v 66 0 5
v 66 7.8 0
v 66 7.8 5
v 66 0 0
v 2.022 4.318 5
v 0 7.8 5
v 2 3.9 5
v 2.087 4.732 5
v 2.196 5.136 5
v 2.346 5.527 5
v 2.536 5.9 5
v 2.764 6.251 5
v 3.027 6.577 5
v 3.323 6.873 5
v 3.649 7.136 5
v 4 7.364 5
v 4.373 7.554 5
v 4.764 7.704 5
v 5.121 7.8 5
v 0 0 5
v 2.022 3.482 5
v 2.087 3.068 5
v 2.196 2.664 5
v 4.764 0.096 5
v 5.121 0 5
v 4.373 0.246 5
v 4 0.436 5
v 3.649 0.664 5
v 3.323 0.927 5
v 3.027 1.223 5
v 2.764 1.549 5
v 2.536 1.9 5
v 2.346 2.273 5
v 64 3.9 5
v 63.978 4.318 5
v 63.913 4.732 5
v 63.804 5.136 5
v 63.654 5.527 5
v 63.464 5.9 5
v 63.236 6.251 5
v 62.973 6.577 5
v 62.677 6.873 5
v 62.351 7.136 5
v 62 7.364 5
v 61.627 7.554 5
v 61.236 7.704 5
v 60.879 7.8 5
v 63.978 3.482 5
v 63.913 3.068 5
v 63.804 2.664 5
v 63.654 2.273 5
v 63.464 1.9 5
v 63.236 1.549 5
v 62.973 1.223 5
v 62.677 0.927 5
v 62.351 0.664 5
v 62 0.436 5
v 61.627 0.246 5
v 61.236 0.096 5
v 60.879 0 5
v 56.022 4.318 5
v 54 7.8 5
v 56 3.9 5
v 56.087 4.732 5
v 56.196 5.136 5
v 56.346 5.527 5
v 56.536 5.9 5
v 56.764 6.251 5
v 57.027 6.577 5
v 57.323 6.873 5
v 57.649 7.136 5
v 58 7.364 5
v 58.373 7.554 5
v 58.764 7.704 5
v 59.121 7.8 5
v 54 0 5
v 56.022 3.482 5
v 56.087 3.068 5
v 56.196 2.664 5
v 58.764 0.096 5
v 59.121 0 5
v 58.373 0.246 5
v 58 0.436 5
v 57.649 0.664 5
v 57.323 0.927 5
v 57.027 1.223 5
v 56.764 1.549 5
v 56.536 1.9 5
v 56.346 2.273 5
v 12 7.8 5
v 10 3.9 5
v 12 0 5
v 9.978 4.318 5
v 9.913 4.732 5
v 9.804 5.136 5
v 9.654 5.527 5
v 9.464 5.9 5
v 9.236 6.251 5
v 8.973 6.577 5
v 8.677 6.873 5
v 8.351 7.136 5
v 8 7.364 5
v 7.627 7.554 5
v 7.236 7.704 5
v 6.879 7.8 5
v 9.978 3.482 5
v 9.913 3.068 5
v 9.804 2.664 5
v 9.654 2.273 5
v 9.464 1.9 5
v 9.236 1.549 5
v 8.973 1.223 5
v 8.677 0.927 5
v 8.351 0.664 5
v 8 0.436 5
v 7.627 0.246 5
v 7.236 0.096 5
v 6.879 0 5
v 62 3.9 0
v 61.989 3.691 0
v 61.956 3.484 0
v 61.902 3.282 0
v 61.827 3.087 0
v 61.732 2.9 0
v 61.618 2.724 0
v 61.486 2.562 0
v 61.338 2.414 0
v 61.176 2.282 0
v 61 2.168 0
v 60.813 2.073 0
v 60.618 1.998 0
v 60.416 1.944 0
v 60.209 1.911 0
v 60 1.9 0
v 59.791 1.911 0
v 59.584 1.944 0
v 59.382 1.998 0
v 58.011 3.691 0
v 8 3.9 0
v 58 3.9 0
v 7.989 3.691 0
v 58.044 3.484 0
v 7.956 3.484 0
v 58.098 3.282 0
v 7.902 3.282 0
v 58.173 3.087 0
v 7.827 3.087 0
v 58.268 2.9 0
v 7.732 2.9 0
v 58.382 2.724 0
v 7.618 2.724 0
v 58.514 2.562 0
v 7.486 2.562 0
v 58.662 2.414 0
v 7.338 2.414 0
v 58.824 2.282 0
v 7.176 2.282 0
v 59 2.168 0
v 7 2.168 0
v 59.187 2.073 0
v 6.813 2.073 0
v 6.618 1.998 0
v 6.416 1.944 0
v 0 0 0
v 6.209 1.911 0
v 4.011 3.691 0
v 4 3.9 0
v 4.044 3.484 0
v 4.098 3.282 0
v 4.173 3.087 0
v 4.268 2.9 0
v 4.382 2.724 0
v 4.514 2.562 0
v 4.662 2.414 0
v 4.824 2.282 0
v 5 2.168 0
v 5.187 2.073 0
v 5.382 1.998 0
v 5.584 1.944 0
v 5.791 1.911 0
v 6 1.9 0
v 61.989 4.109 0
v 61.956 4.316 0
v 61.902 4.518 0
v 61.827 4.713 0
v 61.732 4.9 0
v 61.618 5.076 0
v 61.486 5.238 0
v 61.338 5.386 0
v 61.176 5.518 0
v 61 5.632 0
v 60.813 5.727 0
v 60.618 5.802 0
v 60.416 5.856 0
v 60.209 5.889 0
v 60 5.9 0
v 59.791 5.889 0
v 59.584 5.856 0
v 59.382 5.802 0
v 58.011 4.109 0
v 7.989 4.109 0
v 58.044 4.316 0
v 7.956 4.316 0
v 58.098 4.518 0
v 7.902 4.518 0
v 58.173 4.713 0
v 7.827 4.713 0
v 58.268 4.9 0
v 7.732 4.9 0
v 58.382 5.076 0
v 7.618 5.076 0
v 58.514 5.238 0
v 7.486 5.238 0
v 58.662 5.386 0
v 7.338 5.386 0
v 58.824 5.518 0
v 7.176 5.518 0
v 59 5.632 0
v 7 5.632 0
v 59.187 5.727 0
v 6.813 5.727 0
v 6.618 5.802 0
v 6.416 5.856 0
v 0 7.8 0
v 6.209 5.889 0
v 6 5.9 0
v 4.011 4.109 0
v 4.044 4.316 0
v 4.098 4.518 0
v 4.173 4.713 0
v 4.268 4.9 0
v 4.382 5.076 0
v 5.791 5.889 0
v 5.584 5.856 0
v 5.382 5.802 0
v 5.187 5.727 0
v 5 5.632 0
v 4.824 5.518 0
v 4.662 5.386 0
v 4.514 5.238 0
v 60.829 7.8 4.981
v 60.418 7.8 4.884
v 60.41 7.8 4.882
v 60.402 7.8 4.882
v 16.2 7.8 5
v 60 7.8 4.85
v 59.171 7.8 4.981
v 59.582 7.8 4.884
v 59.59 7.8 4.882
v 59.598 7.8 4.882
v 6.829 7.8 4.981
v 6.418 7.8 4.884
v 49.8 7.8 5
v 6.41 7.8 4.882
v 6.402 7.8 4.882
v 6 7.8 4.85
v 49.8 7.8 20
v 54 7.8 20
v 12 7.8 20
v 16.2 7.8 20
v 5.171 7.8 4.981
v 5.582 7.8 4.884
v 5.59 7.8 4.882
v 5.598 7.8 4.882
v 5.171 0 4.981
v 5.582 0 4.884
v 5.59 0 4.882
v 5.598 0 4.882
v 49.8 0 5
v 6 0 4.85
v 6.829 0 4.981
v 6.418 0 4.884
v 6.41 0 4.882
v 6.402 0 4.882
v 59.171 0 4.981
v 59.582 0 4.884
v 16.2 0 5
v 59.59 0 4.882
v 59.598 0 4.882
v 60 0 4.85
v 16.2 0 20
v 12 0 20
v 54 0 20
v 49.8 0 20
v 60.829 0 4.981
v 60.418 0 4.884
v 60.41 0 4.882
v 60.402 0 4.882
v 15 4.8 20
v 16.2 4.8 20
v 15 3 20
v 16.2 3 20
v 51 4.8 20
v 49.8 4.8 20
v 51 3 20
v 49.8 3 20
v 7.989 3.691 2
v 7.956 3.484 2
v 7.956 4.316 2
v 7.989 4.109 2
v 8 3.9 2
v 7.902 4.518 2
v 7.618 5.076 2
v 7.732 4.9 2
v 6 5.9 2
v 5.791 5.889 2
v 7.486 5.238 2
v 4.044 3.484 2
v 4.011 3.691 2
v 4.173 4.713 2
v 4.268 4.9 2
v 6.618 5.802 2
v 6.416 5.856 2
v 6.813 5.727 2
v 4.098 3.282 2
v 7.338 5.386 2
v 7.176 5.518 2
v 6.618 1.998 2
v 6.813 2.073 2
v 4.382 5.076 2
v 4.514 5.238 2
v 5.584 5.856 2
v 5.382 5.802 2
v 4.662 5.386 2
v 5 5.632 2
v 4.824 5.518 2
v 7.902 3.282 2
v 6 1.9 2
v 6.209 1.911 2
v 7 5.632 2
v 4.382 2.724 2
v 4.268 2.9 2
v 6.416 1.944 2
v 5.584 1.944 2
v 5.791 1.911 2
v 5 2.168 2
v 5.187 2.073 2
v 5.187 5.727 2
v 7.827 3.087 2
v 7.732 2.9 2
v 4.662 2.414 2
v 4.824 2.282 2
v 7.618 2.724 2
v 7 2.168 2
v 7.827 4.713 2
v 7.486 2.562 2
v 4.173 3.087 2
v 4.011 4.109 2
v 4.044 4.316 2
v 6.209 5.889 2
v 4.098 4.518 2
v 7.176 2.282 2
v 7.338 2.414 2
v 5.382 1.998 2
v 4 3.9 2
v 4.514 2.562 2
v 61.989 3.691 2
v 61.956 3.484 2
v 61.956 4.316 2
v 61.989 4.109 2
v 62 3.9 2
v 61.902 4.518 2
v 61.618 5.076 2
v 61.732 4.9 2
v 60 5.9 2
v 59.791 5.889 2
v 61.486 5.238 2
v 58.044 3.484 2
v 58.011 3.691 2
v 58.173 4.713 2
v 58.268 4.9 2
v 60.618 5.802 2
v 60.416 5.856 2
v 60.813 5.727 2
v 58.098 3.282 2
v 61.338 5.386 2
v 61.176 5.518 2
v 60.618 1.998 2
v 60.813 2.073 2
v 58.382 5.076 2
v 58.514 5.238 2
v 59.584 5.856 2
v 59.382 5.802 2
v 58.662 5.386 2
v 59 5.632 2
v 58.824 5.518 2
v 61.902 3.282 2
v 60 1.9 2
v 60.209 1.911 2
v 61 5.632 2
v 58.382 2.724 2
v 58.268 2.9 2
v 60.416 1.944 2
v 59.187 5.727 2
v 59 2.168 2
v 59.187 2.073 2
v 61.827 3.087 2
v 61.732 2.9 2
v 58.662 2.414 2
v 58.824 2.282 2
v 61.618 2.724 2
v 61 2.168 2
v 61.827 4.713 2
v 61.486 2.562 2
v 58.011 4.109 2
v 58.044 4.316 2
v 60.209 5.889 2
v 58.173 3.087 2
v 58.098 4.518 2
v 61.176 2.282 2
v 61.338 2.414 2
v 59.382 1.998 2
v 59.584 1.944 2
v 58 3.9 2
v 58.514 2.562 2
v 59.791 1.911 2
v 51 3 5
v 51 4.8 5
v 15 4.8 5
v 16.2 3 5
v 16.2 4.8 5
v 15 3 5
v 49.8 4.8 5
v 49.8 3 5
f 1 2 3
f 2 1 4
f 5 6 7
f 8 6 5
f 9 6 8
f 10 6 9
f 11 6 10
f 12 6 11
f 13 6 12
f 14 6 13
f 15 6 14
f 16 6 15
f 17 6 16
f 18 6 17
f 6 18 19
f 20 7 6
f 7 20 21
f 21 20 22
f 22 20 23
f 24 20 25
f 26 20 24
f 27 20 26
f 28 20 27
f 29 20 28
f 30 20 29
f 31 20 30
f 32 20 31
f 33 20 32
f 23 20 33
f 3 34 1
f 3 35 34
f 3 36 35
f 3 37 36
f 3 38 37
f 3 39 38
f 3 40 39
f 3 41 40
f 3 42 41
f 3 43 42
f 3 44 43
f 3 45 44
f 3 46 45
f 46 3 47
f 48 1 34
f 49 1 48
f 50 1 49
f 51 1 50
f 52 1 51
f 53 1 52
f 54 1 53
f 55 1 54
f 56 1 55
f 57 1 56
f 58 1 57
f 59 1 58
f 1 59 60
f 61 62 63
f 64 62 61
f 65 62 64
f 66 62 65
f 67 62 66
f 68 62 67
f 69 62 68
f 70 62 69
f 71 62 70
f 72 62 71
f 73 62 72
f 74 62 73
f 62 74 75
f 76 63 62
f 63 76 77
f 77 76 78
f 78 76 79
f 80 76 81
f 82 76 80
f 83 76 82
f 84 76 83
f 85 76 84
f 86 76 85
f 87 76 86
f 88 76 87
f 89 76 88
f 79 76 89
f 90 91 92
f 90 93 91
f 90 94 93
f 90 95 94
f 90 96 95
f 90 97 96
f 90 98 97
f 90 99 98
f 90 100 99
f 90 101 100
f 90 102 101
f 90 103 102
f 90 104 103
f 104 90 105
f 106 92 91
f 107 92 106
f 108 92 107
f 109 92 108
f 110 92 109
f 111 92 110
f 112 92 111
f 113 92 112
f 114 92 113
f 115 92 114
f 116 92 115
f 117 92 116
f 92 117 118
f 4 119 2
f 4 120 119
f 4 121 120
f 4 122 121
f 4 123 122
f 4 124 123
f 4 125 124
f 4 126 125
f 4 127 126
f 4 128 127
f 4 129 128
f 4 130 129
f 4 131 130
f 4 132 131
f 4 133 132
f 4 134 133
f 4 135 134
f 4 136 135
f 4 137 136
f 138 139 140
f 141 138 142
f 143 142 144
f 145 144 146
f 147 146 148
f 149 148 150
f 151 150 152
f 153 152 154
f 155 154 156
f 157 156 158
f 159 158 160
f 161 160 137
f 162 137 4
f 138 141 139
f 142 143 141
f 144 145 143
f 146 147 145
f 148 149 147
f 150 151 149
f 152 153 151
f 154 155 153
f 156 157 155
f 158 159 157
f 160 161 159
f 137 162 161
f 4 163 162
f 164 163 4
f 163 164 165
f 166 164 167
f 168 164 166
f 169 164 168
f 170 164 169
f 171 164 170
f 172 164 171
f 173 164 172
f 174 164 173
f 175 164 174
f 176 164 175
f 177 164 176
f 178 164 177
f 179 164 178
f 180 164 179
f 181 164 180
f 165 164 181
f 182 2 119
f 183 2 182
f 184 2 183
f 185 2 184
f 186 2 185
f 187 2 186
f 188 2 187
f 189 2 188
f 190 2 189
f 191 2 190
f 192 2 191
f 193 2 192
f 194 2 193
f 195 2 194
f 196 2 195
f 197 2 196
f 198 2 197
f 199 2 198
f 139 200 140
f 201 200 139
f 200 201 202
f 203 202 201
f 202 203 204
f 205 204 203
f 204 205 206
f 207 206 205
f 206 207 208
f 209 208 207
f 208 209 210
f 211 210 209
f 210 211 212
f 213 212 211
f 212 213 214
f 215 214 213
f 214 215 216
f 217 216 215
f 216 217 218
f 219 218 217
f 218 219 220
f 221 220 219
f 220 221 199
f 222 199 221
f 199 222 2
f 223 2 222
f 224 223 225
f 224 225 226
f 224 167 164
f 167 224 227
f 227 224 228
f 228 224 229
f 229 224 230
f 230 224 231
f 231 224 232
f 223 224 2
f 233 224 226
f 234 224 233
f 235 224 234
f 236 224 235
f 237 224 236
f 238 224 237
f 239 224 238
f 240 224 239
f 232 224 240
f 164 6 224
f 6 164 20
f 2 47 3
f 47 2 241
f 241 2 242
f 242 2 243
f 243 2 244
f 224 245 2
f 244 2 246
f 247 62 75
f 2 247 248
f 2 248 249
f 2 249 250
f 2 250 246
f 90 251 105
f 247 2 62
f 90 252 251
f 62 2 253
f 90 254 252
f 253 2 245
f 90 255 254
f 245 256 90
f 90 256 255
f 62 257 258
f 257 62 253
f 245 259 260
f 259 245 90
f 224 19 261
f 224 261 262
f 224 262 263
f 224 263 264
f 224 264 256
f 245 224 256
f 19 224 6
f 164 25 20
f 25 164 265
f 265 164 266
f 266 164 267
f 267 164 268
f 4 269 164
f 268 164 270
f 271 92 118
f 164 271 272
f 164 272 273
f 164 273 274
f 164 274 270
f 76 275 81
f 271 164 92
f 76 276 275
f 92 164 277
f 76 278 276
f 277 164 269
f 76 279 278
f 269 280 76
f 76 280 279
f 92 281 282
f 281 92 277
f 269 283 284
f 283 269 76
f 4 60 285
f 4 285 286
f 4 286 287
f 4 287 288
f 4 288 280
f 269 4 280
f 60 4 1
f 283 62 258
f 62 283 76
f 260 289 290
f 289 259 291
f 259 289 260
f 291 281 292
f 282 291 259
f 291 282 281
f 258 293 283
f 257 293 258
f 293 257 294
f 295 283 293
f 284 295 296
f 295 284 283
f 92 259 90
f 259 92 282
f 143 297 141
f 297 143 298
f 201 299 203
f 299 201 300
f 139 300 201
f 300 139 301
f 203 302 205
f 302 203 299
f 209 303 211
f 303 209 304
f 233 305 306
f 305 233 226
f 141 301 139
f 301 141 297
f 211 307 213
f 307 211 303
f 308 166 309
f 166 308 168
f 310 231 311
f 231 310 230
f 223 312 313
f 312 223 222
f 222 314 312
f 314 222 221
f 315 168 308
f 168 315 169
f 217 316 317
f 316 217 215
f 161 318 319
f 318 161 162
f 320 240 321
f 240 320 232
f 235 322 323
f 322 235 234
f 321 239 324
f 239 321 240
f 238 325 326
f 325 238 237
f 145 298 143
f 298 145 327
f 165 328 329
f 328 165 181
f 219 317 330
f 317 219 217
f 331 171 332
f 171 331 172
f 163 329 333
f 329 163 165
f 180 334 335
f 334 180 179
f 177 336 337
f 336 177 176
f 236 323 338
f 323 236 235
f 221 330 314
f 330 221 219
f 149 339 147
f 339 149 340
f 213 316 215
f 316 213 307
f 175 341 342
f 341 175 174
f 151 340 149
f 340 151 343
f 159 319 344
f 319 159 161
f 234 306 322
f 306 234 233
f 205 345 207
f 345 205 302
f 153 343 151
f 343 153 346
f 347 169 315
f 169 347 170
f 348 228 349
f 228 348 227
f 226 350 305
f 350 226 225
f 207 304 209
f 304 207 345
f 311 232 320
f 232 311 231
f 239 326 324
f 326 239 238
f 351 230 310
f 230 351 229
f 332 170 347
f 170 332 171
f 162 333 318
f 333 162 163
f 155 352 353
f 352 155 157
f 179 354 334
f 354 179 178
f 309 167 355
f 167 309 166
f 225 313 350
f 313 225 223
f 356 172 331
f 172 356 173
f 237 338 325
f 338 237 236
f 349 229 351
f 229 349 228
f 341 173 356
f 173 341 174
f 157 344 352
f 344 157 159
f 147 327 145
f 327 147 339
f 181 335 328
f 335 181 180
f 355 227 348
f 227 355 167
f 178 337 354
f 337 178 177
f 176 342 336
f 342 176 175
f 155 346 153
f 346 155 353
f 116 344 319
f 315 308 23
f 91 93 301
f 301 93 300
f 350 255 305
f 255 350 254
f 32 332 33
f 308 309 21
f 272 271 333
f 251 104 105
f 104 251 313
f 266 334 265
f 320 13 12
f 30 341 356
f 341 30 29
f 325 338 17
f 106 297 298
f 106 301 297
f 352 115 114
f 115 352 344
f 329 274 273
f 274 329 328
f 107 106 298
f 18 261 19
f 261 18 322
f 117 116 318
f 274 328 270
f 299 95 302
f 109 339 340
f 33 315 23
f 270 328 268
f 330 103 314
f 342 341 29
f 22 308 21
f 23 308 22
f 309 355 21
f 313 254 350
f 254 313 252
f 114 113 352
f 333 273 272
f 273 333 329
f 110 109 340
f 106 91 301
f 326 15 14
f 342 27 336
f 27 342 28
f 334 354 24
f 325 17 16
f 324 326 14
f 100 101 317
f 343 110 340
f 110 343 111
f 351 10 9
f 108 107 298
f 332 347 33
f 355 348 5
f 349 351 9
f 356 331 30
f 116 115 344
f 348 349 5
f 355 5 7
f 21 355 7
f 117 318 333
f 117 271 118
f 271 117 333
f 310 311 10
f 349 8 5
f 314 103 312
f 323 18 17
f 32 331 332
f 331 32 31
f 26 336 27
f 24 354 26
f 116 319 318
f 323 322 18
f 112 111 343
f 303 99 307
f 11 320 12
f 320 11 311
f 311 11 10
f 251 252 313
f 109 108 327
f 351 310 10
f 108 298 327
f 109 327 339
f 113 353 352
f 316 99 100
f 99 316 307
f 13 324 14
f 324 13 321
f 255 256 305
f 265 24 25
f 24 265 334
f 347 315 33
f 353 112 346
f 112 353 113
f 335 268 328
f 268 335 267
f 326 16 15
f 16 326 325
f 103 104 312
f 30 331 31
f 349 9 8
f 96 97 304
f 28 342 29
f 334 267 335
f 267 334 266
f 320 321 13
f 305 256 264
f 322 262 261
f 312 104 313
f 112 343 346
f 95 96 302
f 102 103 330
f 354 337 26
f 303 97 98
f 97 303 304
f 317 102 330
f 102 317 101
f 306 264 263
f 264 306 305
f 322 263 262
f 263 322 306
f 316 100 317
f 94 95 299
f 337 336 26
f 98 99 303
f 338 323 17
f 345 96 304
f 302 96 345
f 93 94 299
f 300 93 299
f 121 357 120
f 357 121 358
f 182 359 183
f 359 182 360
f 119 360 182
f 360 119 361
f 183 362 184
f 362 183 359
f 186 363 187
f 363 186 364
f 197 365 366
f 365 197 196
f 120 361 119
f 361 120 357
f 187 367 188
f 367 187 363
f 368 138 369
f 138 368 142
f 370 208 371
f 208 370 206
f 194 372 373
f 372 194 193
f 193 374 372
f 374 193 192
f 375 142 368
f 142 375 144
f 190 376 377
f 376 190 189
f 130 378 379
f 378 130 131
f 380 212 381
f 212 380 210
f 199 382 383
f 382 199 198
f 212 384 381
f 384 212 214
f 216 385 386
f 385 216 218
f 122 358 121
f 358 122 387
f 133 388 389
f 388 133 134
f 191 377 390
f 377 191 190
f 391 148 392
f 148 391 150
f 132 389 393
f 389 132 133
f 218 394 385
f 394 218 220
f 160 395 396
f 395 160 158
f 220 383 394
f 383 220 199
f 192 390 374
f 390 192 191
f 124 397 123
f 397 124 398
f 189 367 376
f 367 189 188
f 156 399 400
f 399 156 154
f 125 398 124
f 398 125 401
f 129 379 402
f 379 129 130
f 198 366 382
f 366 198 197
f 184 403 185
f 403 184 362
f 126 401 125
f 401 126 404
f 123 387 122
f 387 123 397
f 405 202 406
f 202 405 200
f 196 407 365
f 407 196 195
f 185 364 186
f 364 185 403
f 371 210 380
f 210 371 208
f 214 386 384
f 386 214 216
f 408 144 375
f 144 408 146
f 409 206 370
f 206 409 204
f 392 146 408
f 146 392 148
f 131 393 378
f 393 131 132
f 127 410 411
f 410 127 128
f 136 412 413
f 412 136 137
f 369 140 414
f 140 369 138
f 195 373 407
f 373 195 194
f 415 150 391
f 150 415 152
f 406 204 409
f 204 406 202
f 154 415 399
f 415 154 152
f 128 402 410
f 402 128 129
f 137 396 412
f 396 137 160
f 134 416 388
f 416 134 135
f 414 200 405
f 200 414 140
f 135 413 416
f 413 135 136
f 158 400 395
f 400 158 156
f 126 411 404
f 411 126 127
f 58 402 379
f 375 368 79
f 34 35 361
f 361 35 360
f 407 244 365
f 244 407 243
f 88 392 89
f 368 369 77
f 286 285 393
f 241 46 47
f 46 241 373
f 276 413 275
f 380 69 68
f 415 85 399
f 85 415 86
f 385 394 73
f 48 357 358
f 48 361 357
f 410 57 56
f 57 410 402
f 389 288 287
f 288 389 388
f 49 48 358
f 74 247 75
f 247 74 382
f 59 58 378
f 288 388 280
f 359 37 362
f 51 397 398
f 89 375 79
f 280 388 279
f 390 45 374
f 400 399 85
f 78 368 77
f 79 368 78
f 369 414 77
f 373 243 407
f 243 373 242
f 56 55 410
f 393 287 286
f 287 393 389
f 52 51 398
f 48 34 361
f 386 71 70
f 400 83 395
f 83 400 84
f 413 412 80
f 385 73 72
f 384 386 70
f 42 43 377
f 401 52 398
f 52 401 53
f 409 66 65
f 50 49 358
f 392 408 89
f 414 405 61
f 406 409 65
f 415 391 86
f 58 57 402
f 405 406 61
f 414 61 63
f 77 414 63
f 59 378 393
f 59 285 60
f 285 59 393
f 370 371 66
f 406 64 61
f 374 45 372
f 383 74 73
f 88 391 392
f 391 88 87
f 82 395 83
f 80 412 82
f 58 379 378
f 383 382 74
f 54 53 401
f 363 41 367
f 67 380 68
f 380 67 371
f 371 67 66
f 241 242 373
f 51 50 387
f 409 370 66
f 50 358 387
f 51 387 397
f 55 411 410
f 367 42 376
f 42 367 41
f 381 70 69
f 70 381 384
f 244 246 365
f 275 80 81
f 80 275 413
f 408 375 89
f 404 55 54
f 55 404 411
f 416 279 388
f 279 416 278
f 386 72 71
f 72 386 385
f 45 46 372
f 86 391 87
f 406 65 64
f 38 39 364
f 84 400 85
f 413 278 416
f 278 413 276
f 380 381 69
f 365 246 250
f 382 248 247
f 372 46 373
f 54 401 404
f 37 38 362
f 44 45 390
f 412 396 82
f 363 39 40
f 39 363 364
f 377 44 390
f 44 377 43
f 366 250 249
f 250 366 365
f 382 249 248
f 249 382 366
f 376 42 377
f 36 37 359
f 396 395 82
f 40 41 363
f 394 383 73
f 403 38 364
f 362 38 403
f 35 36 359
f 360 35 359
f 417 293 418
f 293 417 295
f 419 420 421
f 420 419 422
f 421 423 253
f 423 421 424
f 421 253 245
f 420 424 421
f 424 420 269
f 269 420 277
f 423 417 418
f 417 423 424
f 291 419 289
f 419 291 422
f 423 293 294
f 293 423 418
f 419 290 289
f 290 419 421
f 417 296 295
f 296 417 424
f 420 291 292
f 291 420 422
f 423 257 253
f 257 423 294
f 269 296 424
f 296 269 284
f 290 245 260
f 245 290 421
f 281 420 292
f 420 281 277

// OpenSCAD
$fn = 60;

pcb_width = 36; // adjust depending on manufacturing tolerances for the PCB
pcb_thickness = 1.8;
component_clearance = 1.2; // adjust if that hits components

wall_thickness = 3.0; // thickness of the plastic walls of the groove
slot_depth = 15.0;    // how high up the sides the U-profile grips
base_height = 5.0;    // thickness of the bottom mounting plate
base_extension = 12.0; // how far the base extends out for screws

// screw holes (for standard wood screws)
screw_shanks_dia = 4.0; // diameter of the screw thread
screw_head_dia = 8.0;  // diameter of the recessed screw head
screw_head_depth = 3.0; // how deep the countersink goes

// total width of the plastic tower block before cutting the grooves and middle out
total_width = pcb_width + (2 * wall_thickness);
total_depth = pcb_thickness + (2 * wall_thickness);
total_length = total_width + (2 * base_extension);

difference() {
    union() {
        // base plate for screwing into wood
        cube([total_length, total_depth, base_height]);

        // vertical block across the center (will be hollowed out into towers)
        translate([base_extension, 0, base_height])
            cube([total_width, total_depth, slot_depth]);
    }

    // the pcb slot (cuts the groove depth into the towers)
    // positioned so the PCB edges sit exactly at the right width apart
    translate([base_extension + wall_thickness, wall_thickness, base_height])
        cube([pcb_width, pcb_thickness, slot_depth + 1]);

    // the middle clearance cutout
    // this removes the entire middle section to clear components,
    // leaving behind two towers with inward-facing U-grooves.
    translate([base_extension + wall_thickness + component_clearance, -1, base_height])
        cube([pcb_width - (2 * component_clearance), total_depth + 2, slot_depth + 1]);

    // left screw hole (countersunk)
    translate([base_extension / 2, total_depth / 2, -0.5]) {
        cylinder(d = screw_shanks_dia, h = base_height + 1);
        translate([0, 0, base_height - screw_head_depth + 0.5])
            cylinder(d1 = screw_shanks_dia, d2 = screw_head_dia, h = screw_head_depth);
    }

    // right screw hole (countersunk)
    translate([total_length - (base_extension / 2), total_depth / 2, -0.5]) {
        cylinder(d = screw_shanks_dia, h = base_height + 1);
        translate([0, 0, base_height - screw_head_depth + 0.5])
            cylinder(d1 = screw_shanks_dia, d2 = screw_head_dia, h = screw_head_depth);
    }
}
